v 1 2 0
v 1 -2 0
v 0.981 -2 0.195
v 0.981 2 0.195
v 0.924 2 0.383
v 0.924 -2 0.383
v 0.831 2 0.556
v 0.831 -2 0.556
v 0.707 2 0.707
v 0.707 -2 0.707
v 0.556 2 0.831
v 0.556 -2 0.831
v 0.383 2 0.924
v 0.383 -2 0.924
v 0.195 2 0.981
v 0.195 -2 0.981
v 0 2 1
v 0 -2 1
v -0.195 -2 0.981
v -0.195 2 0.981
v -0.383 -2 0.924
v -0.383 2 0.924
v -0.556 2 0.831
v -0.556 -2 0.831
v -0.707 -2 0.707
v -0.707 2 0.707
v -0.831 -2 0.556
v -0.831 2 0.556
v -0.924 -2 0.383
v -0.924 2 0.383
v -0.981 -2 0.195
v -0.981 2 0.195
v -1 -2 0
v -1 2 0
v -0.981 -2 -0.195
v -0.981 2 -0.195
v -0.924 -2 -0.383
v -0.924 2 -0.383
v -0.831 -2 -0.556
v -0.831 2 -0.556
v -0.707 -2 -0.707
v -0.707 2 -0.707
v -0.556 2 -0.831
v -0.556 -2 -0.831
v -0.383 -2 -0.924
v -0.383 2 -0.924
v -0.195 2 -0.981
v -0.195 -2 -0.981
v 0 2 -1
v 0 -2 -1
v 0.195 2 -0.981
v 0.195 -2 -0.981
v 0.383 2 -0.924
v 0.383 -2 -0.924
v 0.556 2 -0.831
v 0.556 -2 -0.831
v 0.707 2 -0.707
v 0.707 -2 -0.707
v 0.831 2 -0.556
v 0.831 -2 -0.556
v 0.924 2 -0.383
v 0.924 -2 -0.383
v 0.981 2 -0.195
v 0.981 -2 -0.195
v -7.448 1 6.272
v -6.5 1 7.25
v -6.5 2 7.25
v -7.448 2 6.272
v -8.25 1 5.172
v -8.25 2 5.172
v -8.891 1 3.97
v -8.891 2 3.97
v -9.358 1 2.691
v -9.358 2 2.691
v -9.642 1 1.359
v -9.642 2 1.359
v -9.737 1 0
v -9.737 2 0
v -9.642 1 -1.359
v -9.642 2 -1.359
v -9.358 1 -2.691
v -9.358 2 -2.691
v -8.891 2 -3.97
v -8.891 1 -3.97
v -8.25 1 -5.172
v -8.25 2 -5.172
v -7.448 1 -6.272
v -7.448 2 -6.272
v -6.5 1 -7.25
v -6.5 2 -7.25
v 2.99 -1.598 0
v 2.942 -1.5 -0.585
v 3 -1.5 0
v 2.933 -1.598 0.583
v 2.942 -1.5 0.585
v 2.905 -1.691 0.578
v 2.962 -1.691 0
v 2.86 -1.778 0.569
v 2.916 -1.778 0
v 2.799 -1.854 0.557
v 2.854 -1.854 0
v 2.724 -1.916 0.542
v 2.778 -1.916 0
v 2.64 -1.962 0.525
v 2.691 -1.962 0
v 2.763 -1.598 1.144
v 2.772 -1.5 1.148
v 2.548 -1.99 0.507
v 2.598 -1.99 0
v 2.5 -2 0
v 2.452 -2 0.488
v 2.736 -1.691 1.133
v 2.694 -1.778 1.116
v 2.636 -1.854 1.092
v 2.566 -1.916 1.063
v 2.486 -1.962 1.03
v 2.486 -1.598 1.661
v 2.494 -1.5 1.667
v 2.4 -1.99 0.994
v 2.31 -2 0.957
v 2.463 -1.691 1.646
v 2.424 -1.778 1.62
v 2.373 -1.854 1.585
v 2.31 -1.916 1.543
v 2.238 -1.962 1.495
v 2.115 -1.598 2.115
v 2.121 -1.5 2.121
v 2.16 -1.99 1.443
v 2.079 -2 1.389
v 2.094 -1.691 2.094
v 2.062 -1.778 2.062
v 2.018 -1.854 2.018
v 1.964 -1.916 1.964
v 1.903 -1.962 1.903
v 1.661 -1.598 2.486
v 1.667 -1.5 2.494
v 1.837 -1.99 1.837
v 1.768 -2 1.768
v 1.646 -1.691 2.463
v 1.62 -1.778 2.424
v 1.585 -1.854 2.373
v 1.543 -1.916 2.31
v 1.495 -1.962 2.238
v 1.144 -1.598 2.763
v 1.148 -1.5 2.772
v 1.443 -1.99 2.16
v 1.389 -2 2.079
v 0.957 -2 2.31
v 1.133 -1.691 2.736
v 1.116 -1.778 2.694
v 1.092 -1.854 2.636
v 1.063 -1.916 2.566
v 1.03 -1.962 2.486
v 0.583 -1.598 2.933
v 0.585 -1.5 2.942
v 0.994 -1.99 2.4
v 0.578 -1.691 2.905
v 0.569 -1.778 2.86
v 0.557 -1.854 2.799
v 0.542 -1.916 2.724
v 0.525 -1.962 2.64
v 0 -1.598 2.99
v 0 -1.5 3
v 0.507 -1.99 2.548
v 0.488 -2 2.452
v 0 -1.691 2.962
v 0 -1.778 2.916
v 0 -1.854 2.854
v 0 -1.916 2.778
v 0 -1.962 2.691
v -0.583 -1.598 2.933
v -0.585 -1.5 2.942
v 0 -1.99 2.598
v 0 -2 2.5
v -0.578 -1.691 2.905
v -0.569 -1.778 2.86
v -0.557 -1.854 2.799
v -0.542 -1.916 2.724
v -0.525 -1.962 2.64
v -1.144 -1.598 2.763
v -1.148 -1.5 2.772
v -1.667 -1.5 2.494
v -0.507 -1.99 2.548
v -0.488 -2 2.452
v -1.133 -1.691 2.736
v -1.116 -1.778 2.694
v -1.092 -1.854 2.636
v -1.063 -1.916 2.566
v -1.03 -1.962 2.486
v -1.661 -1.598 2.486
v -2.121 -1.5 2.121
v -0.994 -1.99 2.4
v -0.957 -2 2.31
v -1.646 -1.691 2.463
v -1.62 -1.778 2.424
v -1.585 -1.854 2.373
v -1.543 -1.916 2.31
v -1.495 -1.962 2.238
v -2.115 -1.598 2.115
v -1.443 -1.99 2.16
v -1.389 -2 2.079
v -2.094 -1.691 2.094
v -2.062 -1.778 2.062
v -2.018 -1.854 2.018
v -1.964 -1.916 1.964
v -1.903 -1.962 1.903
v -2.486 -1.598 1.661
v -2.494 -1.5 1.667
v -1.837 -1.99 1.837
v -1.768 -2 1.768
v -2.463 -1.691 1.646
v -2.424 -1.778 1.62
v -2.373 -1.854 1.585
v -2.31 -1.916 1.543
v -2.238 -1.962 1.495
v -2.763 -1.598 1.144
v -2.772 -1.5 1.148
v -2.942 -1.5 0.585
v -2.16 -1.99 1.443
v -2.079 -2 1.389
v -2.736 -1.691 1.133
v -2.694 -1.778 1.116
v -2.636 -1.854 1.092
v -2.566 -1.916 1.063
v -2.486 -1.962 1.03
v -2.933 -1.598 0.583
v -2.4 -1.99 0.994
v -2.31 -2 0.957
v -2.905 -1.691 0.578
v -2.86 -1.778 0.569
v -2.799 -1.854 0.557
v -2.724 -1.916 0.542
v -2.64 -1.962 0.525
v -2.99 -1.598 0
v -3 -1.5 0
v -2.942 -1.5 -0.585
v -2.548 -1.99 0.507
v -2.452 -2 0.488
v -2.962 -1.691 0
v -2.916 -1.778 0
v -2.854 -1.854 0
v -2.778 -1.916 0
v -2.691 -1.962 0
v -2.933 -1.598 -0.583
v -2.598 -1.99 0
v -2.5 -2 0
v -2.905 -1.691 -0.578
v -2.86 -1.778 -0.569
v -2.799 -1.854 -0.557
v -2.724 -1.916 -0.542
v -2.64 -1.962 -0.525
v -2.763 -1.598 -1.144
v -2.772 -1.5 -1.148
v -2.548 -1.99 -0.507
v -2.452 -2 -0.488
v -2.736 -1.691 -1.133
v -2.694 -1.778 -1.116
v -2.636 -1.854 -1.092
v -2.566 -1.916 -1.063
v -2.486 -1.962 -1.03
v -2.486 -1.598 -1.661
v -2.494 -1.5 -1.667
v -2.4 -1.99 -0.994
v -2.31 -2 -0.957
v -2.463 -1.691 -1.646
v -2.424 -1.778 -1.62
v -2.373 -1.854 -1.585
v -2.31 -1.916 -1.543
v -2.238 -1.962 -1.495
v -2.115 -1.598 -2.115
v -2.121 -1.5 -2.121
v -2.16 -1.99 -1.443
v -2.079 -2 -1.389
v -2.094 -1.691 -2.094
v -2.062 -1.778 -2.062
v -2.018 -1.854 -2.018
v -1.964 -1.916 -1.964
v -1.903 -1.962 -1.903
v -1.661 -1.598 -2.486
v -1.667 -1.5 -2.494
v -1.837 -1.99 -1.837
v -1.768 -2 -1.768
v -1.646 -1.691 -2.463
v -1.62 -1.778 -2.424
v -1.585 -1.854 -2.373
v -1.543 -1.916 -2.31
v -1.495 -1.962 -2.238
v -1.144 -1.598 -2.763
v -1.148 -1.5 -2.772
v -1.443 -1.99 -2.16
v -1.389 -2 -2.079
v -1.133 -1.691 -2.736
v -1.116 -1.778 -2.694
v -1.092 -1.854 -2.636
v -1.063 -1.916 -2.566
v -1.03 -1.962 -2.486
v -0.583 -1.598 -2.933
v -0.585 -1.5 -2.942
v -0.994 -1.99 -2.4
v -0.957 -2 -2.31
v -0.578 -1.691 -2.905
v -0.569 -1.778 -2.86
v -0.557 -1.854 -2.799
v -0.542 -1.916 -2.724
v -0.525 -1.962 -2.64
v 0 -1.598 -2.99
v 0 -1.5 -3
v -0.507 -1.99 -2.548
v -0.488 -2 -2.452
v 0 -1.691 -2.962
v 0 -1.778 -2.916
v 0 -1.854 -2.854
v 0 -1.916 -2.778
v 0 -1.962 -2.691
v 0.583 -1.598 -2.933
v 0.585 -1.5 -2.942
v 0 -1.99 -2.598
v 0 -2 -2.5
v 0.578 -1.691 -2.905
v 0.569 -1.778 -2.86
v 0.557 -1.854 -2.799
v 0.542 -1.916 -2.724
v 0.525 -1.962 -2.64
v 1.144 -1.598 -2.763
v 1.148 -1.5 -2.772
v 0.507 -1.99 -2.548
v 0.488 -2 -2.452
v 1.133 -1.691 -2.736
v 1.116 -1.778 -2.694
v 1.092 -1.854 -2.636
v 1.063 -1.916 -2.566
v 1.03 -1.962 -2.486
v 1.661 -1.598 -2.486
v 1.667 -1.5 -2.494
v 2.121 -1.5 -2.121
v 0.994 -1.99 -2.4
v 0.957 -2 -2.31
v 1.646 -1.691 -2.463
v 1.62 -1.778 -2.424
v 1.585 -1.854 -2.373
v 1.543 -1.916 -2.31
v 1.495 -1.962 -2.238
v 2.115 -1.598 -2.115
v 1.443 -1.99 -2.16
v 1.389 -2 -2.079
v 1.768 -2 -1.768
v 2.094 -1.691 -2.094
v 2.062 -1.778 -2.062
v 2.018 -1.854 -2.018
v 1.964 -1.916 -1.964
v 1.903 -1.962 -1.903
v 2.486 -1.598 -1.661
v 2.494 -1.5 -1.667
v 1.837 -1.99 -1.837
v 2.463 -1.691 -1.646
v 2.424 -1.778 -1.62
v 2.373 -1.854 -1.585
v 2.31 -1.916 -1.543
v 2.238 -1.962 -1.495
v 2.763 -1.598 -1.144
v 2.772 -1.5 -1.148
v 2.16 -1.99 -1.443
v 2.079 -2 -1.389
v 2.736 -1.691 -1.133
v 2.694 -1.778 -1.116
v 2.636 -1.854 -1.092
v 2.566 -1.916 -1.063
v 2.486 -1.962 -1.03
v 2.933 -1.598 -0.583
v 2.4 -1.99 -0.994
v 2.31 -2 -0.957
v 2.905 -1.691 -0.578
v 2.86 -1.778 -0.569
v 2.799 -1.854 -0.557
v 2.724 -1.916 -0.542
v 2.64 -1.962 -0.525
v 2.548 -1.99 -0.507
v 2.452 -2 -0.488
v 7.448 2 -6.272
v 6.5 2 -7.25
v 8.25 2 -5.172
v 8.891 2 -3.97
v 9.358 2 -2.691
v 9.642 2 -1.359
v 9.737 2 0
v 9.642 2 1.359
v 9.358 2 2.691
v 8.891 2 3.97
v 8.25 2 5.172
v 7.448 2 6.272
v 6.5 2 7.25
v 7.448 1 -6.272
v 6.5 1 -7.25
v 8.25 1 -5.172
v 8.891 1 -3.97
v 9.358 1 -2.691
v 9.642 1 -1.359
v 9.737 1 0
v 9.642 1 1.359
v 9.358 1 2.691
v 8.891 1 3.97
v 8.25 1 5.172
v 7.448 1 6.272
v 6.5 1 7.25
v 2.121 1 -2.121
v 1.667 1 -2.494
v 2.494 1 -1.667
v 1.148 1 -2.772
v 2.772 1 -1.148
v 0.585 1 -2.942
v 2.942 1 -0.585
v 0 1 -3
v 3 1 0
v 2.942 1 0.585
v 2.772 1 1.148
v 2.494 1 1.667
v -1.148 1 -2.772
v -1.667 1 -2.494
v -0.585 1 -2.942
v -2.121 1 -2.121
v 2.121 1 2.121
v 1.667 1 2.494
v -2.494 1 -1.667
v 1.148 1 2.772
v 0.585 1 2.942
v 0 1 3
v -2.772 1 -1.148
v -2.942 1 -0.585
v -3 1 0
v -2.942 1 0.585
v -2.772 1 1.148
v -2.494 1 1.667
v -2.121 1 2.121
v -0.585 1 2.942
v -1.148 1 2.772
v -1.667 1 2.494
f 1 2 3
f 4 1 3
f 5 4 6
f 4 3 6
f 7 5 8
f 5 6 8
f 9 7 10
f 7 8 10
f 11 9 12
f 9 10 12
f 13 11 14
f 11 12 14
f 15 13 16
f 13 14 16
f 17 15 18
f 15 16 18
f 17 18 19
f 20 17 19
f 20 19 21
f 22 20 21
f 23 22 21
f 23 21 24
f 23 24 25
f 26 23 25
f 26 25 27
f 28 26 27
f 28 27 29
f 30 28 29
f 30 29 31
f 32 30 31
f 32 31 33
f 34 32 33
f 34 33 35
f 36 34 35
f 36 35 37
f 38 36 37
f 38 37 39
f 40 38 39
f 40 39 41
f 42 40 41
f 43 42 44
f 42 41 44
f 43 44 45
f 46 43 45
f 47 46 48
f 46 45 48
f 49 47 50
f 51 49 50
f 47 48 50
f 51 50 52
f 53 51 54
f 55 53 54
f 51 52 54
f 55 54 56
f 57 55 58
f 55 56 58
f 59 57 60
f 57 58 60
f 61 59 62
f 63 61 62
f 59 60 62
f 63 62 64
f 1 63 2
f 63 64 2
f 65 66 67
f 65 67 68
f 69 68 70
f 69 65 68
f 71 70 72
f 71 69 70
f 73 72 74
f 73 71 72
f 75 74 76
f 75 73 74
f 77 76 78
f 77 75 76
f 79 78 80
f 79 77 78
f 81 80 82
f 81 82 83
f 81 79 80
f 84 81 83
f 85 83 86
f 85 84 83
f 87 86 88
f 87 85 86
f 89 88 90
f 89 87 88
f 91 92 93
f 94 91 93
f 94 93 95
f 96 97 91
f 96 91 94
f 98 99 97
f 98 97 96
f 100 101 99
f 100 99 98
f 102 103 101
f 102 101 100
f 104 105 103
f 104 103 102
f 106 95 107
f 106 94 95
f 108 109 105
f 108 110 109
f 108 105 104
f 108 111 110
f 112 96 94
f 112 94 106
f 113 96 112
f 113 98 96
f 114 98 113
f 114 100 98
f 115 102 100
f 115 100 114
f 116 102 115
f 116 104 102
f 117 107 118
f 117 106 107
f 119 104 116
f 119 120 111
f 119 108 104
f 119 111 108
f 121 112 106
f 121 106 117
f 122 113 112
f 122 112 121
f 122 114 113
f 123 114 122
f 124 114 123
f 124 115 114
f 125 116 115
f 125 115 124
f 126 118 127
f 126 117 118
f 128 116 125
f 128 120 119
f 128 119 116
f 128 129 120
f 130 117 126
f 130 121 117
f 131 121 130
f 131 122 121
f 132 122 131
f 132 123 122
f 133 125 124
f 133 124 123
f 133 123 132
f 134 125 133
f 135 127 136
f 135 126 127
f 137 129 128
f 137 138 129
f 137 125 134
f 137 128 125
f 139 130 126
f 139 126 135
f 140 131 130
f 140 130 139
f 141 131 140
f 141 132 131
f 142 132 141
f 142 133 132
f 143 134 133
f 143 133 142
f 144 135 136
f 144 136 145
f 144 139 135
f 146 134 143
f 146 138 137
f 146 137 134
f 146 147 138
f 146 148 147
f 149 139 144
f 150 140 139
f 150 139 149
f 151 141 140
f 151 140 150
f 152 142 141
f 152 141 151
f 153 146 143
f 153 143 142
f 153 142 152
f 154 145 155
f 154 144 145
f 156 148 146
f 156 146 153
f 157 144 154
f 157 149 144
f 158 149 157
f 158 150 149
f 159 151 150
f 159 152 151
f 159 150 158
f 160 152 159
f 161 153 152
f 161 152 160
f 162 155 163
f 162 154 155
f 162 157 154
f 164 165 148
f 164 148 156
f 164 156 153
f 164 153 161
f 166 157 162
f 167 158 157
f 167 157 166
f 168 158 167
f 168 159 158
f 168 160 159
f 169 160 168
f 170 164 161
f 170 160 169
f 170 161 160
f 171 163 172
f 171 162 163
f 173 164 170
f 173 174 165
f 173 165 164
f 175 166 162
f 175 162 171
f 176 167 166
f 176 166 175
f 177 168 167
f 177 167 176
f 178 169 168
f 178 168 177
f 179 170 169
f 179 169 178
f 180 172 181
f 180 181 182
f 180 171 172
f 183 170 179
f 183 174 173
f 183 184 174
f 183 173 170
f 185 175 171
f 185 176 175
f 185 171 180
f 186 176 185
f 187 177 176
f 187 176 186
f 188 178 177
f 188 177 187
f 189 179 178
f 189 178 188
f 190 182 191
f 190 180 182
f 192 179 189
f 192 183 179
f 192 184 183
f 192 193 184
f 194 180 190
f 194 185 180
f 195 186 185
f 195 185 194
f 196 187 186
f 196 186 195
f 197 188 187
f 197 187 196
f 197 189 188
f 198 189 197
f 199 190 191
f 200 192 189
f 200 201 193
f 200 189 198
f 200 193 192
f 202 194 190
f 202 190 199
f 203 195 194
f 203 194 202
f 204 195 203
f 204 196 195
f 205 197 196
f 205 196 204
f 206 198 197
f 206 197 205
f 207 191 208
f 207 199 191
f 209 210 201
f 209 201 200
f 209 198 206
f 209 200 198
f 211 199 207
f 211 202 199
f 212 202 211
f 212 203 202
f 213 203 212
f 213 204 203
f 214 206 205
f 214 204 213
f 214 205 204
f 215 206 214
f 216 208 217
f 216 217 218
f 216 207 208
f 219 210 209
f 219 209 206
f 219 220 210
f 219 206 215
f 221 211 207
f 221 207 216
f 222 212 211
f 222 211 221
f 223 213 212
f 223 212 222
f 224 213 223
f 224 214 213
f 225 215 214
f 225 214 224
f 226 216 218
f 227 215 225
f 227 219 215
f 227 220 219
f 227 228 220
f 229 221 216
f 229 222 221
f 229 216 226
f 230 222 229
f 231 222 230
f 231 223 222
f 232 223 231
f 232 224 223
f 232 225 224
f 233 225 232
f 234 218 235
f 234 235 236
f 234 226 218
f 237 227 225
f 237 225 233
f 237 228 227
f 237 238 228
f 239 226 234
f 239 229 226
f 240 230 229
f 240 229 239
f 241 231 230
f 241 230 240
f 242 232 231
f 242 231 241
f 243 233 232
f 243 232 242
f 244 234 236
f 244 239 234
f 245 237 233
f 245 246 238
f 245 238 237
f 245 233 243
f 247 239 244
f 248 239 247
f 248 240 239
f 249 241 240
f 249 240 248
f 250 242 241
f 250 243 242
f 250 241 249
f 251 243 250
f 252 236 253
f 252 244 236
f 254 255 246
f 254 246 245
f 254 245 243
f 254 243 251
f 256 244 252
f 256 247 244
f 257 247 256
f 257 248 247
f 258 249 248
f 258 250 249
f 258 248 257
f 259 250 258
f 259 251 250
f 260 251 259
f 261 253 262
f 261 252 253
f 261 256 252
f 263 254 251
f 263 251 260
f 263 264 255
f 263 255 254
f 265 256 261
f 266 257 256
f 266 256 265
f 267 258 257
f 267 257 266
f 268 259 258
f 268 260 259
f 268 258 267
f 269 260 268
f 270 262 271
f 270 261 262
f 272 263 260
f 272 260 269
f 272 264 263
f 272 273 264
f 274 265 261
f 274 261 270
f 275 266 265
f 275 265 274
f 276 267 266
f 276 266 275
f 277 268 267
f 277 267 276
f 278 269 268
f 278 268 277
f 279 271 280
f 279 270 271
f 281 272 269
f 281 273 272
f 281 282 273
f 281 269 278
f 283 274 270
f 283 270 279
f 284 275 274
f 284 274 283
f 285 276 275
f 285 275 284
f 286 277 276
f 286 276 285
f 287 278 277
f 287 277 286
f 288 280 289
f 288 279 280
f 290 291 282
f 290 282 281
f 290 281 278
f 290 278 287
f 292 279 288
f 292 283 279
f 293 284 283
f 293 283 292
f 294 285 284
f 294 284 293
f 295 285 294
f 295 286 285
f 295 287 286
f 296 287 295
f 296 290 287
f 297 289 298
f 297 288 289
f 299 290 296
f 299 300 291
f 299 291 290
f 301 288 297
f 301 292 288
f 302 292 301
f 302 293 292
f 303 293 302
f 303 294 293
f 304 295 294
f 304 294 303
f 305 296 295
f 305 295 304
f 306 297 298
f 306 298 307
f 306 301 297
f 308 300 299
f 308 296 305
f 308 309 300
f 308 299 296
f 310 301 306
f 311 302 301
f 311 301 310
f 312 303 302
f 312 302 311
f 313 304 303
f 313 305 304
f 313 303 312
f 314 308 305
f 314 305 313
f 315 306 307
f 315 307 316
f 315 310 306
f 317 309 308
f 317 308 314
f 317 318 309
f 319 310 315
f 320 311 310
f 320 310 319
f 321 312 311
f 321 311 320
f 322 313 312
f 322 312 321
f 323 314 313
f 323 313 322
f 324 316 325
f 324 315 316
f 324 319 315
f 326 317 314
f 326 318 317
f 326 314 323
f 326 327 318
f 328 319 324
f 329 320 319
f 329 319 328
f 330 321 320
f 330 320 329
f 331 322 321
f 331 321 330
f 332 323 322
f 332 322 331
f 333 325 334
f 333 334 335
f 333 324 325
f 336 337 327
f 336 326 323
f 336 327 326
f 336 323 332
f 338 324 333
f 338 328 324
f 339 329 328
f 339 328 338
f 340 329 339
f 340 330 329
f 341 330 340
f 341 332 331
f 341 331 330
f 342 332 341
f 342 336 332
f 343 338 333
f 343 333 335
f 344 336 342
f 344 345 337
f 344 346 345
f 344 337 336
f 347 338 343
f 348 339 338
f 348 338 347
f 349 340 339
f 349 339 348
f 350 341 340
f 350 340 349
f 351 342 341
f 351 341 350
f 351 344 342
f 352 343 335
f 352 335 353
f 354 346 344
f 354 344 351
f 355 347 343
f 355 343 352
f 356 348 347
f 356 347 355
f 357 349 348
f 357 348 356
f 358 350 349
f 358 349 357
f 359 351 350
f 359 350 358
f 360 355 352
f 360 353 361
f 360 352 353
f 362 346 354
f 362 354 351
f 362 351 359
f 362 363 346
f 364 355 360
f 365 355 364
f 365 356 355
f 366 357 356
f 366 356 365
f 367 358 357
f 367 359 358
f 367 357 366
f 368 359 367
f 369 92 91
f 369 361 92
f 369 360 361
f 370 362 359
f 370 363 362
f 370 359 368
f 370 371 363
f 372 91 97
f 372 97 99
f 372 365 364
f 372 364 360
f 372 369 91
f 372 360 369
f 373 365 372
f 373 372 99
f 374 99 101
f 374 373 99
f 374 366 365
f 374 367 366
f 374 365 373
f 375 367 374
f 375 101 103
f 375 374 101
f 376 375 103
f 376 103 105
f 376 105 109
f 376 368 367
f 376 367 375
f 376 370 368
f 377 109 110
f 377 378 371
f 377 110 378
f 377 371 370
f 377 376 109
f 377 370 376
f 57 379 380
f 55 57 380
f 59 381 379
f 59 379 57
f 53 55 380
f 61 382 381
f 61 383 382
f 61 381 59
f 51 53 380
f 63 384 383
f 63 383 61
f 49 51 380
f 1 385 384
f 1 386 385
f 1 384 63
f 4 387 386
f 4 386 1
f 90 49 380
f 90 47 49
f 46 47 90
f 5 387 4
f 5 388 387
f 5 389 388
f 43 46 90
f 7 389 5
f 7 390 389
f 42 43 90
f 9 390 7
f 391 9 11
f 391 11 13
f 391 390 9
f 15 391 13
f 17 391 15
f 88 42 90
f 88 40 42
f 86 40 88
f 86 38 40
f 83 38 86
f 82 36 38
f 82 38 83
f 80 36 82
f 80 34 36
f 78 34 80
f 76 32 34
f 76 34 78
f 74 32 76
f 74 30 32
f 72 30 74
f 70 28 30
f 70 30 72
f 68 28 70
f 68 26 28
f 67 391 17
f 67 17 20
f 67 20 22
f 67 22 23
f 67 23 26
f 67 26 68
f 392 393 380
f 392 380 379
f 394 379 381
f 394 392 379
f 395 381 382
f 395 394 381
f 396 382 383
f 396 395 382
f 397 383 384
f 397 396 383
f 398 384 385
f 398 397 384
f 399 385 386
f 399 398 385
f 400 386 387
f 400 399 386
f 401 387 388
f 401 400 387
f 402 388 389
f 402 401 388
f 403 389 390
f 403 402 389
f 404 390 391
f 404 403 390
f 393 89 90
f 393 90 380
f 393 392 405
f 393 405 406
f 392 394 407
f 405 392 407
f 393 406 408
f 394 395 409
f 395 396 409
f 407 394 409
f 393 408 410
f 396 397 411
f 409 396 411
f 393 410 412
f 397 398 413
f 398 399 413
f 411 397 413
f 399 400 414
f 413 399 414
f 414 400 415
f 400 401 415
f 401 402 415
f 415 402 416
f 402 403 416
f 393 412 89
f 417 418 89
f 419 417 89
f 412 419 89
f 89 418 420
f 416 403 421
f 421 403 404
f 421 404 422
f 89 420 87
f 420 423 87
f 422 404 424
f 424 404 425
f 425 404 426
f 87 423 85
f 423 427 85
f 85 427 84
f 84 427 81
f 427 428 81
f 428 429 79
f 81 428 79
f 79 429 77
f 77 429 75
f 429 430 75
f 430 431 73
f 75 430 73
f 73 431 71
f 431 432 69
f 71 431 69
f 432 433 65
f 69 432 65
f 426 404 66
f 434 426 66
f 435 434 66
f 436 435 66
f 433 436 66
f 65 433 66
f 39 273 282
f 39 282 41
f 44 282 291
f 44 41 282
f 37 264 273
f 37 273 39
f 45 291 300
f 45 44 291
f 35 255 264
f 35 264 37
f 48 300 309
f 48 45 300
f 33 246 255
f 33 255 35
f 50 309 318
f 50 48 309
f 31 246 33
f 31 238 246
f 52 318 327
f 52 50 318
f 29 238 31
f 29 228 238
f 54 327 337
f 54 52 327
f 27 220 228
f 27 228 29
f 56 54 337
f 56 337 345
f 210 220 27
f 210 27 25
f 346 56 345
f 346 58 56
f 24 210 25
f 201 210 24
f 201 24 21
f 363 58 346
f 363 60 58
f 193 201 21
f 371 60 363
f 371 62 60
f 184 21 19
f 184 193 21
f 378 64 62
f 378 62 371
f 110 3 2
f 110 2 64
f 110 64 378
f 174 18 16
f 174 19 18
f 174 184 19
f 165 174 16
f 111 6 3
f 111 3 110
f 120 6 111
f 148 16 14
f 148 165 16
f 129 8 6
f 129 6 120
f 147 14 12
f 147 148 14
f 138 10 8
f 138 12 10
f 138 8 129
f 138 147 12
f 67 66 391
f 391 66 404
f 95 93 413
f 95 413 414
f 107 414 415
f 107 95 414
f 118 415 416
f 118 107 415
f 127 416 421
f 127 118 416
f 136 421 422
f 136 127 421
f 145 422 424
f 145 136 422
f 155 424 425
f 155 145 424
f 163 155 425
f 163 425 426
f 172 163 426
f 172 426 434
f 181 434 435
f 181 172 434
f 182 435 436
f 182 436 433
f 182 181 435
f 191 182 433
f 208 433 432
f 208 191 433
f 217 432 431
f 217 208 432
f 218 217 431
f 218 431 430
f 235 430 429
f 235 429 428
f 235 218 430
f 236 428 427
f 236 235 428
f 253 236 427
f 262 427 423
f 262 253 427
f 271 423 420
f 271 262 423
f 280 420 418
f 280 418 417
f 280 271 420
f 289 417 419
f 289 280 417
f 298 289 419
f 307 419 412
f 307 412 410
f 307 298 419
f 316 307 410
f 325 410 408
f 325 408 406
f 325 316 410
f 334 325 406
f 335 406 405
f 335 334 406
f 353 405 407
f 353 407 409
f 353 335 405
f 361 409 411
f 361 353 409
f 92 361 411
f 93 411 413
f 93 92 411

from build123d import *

# Parameters (mm, degrees)
SKETCH255_AS_DRAWN_R                 = 1
EXTRUDE056_DEPTH                     = 5
EXTRUDE056_ONTO_SKETCH255_ROLL_ANGLE = 90
SKETCH254_AS_DRAWN_R                 = 3
EXTRUDE057_DEPTH                     = 3
EXTRUDE057_ONTO_SKETCH254_ROLL_ANGLE = 90
FILLET003_R                          = 0.5
EXTRUDE048_DEPTH                     = 1
EXTRUDE048_ONTO_SKETCH245_ROLL_ANGLE = 90


with BuildPart() as extrude056:
    # Sketch255 as drawn → Extrude056 (new)
    with BuildSketch(Plane.XY):
        Circle(SKETCH255_AS_DRAWN_R)
    extrude(amount=-EXTRUDE056_DEPTH)


with BuildPart() as extrude056_1:
    # Extrude056 onto Sketch255 roll: moved
    add(extrude056.part.rotate(Axis((0, 0, 0), (1, 0, 0)), EXTRUDE056_ONTO_SKETCH255_ROLL_ANGLE))


with BuildPart() as extrude056_2:
    # Extrude056 onto Sketch255 placement: moved
    add(extrude056_1.part.moved(Location((0, -3, 0))))


with BuildPart() as fillet003:
    # Sketch254 as drawn → Extrude057 (new)
    with BuildSketch(Plane.XY):
        Circle(SKETCH254_AS_DRAWN_R)
    extrude(amount=-EXTRUDE057_DEPTH)


with BuildPart() as fillet003_1:
    # Extrude057 onto Sketch254 roll: moved
    add(fillet003.part.rotate(Axis((0, 0, 0), (1, 0, 0)), EXTRUDE057_ONTO_SKETCH254_ROLL_ANGLE))


with BuildPart() as fillet003_2:
    # Extrude057 onto Sketch254 placement: moved
    add(fillet003_1.part.moved(Location((0, -2.5, 0))))


with BuildPart() as fillet003_3:
    # Extrude057 placement: moved
    add(fillet003_2.part.moved(Location((0, 0.5, 0))))

    # Fillet003
    fillet003_edges = [fillet003_3.edges().sort_by_distance(p)[0] for p in [
        (-3, -2, 0),
    ]]
    fillet(fillet003_edges, radius=FILLET003_R)


with BuildPart() as cut034:
    # Sketch245 as drawn → Extrude048 (new)
    with BuildSketch(Plane.XY):
        with BuildLine():
            Line((-6.5, 7.250002), (6.499997, 7.250002))
            ThreePointArc((6.499997, -7.250002), (9.737171, 0), (6.499997, 7.250002))
            Line((-6.5, -7.250002), (6.499997, -7.250002))
            ThreePointArc((-6.5, 7.250002), (-9.737172, 0), (-6.5, -7.250002))
        make_face()
    extrude(amount=-EXTRUDE048_DEPTH)


with BuildPart() as cut034_1:
    # Extrude048 onto Sketch245 roll: moved
    add(cut034.part.rotate(Axis((0, 0, 0), (1, 0, 0)), EXTRUDE048_ONTO_SKETCH245_ROLL_ANGLE))


with BuildPart() as cut034_2:
    # Extrude048 onto Sketch245 placement: moved
    add(cut034_1.part)


with BuildPart() as cut034_3:
    # Extrude048 placement: moved
    add(cut034_2.part.moved(Location((0, 1, 0))))

    # Fusion018: union Fillet003
    add(fillet003_3.part)

    # Cut034: cut Extrude056
    add(extrude056_2.part, mode=Mode.SUBTRACT)


solid = cut034_3.part
